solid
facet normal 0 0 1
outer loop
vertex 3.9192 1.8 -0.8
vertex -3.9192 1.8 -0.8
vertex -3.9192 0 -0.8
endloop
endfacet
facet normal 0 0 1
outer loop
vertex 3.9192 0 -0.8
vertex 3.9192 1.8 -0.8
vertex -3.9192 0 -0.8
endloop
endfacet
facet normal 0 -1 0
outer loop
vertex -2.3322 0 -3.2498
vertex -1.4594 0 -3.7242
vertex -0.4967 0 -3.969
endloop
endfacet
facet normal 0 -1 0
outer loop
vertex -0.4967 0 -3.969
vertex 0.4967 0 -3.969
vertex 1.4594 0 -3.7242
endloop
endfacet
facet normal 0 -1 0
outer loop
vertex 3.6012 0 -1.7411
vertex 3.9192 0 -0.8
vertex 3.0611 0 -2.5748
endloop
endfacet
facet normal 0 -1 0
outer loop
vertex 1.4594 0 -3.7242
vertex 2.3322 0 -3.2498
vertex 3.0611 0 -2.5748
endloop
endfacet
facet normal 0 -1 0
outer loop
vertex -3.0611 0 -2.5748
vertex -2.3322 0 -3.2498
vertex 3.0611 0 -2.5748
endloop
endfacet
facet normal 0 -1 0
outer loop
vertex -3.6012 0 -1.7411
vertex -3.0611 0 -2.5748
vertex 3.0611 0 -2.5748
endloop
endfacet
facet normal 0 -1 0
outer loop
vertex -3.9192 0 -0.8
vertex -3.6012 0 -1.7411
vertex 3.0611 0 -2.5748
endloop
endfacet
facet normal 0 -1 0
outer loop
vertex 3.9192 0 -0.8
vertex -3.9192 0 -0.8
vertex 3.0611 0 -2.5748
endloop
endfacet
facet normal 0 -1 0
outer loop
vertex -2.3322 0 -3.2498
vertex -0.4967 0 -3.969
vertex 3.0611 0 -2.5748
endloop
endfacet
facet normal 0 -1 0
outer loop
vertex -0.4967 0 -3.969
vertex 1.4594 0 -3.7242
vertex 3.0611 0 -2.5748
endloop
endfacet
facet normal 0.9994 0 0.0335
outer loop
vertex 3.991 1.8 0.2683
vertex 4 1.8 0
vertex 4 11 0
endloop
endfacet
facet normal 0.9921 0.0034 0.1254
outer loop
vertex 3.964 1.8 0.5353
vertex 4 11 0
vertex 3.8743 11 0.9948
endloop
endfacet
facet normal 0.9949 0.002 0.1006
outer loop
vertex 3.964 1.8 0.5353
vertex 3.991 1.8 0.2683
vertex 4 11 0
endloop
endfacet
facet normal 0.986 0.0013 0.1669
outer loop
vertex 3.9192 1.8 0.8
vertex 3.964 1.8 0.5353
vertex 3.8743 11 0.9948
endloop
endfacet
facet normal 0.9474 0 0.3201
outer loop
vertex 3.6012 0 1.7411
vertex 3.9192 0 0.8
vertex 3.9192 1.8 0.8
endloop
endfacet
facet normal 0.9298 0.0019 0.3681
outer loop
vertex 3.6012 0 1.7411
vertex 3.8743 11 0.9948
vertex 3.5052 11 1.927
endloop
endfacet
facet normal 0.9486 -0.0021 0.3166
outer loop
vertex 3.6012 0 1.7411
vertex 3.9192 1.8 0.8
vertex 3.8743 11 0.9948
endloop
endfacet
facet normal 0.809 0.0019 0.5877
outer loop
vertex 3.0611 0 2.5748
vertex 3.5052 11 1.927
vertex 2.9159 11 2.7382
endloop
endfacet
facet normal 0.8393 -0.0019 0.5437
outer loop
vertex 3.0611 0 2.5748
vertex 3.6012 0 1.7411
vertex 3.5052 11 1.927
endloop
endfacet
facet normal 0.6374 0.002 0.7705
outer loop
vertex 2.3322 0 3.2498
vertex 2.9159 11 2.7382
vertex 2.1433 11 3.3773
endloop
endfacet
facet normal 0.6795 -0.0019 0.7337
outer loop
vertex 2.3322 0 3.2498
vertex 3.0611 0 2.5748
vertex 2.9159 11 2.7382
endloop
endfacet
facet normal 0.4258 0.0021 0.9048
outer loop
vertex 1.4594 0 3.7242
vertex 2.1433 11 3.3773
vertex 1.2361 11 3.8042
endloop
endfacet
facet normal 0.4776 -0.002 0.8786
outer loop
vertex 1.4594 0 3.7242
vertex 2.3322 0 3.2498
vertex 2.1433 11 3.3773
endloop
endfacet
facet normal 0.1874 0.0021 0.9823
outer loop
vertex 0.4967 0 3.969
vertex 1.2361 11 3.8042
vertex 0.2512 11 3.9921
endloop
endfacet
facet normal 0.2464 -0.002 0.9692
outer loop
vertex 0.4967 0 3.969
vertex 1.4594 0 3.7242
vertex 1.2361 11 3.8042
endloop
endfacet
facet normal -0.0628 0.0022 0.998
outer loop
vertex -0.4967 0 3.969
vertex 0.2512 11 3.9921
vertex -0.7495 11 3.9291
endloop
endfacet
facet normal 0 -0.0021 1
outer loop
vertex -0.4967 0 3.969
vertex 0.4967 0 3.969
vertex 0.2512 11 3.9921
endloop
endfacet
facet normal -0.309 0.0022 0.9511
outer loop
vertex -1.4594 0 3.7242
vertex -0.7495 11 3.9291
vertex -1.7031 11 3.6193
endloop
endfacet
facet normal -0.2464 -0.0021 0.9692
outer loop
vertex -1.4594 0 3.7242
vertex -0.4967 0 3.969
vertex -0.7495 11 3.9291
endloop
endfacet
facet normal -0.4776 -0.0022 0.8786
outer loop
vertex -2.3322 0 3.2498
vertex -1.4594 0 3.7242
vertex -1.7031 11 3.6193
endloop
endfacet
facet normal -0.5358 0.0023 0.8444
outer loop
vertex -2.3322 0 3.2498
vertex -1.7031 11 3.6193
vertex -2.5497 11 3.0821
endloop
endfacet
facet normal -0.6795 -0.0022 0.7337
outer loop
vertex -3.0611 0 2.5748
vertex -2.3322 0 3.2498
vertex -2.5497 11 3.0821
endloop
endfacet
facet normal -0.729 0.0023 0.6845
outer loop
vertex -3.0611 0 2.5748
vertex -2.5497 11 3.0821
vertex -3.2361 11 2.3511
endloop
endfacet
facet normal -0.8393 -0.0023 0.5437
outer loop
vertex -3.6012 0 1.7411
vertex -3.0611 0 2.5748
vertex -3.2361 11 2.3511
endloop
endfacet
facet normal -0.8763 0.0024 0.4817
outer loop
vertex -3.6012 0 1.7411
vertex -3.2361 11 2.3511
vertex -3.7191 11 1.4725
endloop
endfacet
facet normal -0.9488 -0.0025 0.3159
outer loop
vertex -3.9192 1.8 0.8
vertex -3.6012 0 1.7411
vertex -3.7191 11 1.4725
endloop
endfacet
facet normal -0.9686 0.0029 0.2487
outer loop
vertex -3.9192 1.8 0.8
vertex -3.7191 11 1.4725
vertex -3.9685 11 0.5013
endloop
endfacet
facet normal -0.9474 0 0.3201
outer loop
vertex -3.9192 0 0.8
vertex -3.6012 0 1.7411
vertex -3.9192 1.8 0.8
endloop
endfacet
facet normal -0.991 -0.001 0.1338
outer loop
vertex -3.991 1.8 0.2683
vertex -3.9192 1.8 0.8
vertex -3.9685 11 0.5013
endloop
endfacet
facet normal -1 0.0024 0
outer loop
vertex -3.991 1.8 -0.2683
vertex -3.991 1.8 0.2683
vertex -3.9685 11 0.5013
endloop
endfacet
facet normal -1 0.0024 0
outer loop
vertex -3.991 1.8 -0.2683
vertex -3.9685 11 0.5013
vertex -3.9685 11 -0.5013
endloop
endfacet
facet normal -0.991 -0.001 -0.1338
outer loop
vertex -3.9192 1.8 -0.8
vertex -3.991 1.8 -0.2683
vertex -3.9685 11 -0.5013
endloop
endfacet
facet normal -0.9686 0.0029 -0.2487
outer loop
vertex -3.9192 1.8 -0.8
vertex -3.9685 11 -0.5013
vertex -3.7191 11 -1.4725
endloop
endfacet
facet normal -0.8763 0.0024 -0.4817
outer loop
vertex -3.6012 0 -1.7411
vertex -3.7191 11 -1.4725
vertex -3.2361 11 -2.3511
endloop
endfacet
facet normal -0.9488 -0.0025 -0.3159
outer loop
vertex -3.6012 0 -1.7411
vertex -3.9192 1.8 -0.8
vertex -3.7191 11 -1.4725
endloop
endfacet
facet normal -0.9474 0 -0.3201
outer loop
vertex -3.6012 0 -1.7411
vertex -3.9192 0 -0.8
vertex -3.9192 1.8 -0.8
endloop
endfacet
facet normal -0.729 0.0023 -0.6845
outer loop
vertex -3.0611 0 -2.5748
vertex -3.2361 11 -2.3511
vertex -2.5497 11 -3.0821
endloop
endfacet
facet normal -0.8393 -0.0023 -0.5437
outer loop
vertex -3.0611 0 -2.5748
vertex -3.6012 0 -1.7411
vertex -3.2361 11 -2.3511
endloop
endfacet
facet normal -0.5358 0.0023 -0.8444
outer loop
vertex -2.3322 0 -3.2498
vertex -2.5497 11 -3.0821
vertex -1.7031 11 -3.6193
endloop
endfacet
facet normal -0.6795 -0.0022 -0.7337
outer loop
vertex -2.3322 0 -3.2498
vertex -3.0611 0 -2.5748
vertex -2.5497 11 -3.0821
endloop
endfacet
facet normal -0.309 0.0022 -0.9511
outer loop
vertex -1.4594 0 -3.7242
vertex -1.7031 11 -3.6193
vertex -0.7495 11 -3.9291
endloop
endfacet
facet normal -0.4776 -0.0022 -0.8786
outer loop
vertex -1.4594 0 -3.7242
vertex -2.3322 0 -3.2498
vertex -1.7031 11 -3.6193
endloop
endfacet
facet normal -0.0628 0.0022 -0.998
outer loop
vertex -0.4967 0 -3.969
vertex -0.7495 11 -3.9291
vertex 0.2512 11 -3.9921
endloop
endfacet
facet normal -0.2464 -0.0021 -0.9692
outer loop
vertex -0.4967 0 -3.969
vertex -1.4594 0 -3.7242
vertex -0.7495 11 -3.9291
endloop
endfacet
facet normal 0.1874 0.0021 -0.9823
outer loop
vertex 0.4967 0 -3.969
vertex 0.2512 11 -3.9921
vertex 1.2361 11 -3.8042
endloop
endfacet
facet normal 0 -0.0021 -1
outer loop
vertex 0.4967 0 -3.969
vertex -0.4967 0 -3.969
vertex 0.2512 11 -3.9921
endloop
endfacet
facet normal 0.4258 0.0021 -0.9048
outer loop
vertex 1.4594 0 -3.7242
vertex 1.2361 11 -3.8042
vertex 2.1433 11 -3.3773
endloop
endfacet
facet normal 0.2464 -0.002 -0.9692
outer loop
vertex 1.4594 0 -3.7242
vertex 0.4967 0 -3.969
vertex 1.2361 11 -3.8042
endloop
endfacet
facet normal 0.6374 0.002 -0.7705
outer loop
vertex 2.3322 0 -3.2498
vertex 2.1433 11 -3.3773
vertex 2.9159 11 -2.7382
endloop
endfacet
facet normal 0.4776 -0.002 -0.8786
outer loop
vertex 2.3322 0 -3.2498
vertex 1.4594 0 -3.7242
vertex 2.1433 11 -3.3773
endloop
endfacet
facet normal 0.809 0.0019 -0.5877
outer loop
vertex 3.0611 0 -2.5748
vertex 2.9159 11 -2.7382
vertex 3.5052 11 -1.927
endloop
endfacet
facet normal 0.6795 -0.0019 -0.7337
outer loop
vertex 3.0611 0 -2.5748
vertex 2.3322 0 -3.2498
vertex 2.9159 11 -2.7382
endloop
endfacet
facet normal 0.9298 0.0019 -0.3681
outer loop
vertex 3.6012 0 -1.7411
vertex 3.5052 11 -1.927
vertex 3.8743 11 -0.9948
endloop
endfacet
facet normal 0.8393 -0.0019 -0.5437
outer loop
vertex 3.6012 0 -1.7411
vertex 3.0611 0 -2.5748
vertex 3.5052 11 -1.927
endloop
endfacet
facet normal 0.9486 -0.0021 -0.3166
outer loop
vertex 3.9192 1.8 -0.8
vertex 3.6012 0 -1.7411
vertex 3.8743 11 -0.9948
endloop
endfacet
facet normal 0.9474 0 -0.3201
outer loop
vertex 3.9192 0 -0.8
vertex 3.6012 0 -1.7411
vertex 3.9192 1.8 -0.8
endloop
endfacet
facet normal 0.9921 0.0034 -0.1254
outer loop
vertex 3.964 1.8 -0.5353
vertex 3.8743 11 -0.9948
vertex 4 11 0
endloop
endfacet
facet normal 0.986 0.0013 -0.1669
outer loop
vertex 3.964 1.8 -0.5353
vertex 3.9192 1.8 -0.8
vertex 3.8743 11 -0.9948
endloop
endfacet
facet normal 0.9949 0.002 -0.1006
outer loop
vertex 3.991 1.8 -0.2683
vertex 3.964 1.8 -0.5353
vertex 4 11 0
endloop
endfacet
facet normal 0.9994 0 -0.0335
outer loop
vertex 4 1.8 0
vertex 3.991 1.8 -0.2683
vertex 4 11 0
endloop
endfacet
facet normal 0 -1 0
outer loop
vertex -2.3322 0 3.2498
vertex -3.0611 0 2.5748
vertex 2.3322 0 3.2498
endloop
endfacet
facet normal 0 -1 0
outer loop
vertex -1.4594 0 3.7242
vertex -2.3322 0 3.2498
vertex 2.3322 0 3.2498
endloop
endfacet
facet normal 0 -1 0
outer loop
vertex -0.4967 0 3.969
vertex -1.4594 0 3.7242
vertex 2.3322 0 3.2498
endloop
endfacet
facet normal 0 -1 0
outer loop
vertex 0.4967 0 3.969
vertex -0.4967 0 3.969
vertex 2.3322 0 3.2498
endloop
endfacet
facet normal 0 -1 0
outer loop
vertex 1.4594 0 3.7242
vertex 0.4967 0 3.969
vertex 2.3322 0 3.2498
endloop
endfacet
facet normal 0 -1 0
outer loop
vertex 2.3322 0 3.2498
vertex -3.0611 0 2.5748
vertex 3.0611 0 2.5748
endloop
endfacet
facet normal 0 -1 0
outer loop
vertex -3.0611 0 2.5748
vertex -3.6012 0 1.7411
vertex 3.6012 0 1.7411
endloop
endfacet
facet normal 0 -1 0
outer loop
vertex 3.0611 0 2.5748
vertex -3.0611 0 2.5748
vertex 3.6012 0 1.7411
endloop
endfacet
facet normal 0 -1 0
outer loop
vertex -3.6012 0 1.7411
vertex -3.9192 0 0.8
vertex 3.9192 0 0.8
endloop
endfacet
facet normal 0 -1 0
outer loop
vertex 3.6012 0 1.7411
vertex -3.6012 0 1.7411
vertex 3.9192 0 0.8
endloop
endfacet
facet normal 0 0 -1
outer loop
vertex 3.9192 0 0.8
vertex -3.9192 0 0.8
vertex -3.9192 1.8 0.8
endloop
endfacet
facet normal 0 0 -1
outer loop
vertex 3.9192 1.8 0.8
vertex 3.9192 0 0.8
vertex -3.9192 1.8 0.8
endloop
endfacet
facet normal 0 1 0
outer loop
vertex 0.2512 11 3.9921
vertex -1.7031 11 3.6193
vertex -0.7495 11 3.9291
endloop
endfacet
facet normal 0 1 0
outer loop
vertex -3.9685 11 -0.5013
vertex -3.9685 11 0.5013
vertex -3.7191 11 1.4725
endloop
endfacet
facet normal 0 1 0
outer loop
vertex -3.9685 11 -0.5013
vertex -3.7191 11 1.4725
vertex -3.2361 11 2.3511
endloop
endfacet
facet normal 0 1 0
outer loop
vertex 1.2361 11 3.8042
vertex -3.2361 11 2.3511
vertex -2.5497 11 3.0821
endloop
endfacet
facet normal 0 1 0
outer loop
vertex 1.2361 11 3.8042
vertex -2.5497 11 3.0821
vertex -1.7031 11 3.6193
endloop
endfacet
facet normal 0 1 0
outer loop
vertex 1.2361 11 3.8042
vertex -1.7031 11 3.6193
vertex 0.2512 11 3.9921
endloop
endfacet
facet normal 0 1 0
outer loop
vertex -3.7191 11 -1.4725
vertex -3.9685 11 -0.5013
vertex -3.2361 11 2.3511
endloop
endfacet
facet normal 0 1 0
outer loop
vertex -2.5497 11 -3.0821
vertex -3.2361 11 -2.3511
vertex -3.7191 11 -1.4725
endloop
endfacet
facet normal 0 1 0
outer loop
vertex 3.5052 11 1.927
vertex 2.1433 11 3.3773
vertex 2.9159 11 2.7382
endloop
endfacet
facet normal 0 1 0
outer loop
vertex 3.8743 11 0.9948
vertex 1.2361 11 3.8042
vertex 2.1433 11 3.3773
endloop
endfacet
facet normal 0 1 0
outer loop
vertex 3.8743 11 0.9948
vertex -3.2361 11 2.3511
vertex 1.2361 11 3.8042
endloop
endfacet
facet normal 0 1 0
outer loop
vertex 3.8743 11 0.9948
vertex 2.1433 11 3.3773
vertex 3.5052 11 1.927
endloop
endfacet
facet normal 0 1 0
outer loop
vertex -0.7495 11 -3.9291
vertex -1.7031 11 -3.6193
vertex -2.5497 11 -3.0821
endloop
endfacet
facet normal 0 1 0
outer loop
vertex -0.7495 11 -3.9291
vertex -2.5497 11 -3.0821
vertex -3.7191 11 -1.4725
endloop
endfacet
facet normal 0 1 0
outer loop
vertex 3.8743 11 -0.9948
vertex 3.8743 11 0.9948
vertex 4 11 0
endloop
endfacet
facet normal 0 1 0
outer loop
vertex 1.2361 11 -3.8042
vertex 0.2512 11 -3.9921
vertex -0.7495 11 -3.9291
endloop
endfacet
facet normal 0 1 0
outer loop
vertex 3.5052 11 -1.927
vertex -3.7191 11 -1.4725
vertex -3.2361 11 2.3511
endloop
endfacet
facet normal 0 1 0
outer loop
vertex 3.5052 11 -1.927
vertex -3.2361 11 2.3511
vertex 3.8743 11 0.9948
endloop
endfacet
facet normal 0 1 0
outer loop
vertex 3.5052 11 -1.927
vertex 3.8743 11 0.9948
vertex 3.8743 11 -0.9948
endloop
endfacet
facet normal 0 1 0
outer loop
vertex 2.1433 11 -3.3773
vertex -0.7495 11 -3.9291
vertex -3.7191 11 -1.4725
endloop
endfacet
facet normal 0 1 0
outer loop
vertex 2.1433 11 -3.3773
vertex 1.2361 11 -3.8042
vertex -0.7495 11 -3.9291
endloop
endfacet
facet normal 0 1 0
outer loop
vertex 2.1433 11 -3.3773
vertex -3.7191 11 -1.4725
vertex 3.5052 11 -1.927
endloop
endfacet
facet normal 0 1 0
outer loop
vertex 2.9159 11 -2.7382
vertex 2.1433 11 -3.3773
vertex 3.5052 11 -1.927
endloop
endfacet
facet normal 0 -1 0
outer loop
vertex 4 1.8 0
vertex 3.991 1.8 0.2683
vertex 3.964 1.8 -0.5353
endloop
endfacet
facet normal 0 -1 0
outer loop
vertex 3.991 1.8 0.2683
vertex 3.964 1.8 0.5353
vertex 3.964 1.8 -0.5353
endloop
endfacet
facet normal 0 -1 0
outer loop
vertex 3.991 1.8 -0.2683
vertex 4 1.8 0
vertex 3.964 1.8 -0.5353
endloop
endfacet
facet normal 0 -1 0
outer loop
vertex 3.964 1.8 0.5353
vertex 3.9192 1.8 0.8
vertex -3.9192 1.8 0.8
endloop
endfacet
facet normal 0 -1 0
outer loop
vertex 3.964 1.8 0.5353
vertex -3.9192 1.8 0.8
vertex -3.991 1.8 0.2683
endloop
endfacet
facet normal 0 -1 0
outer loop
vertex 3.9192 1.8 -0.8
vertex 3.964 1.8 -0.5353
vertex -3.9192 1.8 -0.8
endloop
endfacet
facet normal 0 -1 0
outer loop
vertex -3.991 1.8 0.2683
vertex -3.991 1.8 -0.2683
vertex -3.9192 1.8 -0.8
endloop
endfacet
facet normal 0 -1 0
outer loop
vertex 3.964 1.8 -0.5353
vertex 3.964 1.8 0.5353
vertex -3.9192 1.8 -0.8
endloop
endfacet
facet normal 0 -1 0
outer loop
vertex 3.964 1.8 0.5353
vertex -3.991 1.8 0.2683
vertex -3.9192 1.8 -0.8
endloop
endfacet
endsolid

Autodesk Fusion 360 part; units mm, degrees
sketch "Sketch1" plane through (0, 0, 0) normal (0, 1, 0) x (1, 0, 0)
  circle A0 centre (0, 0) radius 4
  dimension "d1" = 8
extrude "Extrude1" add sketch "Sketch1" along normal blind 11
sketch "Sketch2" plane through (0, 0, 0) normal (1, 0, 0) x (0, 1, 0)
  line L0 (0, -4) -> (0, 4)
  line L1 (0, 0) -> (0, 0.8)
  line L2 (0, 0.8) -> (0, -0.8)
  line L3 (0, 0) -> (0, 0.8)
  line L4 (0, 0.8) -> (0, -0.8)
  line L5 (0, 0.8) -> (1.8, 0.8)
  line L6 (1.8, 0.8) -> (1.8, -0.8)
  line L7 (1.8, -0.8) -> (0, -0.8)
  dimension "d6" = 0.8
  dimension "d7" = 1.6
  dimension "d8" = 1.8
  dimension "d9" = 1.6
extrude "Extrude2" cut sketch "Sketch2" along normal blind 5.3 and the other way blind 4.5
